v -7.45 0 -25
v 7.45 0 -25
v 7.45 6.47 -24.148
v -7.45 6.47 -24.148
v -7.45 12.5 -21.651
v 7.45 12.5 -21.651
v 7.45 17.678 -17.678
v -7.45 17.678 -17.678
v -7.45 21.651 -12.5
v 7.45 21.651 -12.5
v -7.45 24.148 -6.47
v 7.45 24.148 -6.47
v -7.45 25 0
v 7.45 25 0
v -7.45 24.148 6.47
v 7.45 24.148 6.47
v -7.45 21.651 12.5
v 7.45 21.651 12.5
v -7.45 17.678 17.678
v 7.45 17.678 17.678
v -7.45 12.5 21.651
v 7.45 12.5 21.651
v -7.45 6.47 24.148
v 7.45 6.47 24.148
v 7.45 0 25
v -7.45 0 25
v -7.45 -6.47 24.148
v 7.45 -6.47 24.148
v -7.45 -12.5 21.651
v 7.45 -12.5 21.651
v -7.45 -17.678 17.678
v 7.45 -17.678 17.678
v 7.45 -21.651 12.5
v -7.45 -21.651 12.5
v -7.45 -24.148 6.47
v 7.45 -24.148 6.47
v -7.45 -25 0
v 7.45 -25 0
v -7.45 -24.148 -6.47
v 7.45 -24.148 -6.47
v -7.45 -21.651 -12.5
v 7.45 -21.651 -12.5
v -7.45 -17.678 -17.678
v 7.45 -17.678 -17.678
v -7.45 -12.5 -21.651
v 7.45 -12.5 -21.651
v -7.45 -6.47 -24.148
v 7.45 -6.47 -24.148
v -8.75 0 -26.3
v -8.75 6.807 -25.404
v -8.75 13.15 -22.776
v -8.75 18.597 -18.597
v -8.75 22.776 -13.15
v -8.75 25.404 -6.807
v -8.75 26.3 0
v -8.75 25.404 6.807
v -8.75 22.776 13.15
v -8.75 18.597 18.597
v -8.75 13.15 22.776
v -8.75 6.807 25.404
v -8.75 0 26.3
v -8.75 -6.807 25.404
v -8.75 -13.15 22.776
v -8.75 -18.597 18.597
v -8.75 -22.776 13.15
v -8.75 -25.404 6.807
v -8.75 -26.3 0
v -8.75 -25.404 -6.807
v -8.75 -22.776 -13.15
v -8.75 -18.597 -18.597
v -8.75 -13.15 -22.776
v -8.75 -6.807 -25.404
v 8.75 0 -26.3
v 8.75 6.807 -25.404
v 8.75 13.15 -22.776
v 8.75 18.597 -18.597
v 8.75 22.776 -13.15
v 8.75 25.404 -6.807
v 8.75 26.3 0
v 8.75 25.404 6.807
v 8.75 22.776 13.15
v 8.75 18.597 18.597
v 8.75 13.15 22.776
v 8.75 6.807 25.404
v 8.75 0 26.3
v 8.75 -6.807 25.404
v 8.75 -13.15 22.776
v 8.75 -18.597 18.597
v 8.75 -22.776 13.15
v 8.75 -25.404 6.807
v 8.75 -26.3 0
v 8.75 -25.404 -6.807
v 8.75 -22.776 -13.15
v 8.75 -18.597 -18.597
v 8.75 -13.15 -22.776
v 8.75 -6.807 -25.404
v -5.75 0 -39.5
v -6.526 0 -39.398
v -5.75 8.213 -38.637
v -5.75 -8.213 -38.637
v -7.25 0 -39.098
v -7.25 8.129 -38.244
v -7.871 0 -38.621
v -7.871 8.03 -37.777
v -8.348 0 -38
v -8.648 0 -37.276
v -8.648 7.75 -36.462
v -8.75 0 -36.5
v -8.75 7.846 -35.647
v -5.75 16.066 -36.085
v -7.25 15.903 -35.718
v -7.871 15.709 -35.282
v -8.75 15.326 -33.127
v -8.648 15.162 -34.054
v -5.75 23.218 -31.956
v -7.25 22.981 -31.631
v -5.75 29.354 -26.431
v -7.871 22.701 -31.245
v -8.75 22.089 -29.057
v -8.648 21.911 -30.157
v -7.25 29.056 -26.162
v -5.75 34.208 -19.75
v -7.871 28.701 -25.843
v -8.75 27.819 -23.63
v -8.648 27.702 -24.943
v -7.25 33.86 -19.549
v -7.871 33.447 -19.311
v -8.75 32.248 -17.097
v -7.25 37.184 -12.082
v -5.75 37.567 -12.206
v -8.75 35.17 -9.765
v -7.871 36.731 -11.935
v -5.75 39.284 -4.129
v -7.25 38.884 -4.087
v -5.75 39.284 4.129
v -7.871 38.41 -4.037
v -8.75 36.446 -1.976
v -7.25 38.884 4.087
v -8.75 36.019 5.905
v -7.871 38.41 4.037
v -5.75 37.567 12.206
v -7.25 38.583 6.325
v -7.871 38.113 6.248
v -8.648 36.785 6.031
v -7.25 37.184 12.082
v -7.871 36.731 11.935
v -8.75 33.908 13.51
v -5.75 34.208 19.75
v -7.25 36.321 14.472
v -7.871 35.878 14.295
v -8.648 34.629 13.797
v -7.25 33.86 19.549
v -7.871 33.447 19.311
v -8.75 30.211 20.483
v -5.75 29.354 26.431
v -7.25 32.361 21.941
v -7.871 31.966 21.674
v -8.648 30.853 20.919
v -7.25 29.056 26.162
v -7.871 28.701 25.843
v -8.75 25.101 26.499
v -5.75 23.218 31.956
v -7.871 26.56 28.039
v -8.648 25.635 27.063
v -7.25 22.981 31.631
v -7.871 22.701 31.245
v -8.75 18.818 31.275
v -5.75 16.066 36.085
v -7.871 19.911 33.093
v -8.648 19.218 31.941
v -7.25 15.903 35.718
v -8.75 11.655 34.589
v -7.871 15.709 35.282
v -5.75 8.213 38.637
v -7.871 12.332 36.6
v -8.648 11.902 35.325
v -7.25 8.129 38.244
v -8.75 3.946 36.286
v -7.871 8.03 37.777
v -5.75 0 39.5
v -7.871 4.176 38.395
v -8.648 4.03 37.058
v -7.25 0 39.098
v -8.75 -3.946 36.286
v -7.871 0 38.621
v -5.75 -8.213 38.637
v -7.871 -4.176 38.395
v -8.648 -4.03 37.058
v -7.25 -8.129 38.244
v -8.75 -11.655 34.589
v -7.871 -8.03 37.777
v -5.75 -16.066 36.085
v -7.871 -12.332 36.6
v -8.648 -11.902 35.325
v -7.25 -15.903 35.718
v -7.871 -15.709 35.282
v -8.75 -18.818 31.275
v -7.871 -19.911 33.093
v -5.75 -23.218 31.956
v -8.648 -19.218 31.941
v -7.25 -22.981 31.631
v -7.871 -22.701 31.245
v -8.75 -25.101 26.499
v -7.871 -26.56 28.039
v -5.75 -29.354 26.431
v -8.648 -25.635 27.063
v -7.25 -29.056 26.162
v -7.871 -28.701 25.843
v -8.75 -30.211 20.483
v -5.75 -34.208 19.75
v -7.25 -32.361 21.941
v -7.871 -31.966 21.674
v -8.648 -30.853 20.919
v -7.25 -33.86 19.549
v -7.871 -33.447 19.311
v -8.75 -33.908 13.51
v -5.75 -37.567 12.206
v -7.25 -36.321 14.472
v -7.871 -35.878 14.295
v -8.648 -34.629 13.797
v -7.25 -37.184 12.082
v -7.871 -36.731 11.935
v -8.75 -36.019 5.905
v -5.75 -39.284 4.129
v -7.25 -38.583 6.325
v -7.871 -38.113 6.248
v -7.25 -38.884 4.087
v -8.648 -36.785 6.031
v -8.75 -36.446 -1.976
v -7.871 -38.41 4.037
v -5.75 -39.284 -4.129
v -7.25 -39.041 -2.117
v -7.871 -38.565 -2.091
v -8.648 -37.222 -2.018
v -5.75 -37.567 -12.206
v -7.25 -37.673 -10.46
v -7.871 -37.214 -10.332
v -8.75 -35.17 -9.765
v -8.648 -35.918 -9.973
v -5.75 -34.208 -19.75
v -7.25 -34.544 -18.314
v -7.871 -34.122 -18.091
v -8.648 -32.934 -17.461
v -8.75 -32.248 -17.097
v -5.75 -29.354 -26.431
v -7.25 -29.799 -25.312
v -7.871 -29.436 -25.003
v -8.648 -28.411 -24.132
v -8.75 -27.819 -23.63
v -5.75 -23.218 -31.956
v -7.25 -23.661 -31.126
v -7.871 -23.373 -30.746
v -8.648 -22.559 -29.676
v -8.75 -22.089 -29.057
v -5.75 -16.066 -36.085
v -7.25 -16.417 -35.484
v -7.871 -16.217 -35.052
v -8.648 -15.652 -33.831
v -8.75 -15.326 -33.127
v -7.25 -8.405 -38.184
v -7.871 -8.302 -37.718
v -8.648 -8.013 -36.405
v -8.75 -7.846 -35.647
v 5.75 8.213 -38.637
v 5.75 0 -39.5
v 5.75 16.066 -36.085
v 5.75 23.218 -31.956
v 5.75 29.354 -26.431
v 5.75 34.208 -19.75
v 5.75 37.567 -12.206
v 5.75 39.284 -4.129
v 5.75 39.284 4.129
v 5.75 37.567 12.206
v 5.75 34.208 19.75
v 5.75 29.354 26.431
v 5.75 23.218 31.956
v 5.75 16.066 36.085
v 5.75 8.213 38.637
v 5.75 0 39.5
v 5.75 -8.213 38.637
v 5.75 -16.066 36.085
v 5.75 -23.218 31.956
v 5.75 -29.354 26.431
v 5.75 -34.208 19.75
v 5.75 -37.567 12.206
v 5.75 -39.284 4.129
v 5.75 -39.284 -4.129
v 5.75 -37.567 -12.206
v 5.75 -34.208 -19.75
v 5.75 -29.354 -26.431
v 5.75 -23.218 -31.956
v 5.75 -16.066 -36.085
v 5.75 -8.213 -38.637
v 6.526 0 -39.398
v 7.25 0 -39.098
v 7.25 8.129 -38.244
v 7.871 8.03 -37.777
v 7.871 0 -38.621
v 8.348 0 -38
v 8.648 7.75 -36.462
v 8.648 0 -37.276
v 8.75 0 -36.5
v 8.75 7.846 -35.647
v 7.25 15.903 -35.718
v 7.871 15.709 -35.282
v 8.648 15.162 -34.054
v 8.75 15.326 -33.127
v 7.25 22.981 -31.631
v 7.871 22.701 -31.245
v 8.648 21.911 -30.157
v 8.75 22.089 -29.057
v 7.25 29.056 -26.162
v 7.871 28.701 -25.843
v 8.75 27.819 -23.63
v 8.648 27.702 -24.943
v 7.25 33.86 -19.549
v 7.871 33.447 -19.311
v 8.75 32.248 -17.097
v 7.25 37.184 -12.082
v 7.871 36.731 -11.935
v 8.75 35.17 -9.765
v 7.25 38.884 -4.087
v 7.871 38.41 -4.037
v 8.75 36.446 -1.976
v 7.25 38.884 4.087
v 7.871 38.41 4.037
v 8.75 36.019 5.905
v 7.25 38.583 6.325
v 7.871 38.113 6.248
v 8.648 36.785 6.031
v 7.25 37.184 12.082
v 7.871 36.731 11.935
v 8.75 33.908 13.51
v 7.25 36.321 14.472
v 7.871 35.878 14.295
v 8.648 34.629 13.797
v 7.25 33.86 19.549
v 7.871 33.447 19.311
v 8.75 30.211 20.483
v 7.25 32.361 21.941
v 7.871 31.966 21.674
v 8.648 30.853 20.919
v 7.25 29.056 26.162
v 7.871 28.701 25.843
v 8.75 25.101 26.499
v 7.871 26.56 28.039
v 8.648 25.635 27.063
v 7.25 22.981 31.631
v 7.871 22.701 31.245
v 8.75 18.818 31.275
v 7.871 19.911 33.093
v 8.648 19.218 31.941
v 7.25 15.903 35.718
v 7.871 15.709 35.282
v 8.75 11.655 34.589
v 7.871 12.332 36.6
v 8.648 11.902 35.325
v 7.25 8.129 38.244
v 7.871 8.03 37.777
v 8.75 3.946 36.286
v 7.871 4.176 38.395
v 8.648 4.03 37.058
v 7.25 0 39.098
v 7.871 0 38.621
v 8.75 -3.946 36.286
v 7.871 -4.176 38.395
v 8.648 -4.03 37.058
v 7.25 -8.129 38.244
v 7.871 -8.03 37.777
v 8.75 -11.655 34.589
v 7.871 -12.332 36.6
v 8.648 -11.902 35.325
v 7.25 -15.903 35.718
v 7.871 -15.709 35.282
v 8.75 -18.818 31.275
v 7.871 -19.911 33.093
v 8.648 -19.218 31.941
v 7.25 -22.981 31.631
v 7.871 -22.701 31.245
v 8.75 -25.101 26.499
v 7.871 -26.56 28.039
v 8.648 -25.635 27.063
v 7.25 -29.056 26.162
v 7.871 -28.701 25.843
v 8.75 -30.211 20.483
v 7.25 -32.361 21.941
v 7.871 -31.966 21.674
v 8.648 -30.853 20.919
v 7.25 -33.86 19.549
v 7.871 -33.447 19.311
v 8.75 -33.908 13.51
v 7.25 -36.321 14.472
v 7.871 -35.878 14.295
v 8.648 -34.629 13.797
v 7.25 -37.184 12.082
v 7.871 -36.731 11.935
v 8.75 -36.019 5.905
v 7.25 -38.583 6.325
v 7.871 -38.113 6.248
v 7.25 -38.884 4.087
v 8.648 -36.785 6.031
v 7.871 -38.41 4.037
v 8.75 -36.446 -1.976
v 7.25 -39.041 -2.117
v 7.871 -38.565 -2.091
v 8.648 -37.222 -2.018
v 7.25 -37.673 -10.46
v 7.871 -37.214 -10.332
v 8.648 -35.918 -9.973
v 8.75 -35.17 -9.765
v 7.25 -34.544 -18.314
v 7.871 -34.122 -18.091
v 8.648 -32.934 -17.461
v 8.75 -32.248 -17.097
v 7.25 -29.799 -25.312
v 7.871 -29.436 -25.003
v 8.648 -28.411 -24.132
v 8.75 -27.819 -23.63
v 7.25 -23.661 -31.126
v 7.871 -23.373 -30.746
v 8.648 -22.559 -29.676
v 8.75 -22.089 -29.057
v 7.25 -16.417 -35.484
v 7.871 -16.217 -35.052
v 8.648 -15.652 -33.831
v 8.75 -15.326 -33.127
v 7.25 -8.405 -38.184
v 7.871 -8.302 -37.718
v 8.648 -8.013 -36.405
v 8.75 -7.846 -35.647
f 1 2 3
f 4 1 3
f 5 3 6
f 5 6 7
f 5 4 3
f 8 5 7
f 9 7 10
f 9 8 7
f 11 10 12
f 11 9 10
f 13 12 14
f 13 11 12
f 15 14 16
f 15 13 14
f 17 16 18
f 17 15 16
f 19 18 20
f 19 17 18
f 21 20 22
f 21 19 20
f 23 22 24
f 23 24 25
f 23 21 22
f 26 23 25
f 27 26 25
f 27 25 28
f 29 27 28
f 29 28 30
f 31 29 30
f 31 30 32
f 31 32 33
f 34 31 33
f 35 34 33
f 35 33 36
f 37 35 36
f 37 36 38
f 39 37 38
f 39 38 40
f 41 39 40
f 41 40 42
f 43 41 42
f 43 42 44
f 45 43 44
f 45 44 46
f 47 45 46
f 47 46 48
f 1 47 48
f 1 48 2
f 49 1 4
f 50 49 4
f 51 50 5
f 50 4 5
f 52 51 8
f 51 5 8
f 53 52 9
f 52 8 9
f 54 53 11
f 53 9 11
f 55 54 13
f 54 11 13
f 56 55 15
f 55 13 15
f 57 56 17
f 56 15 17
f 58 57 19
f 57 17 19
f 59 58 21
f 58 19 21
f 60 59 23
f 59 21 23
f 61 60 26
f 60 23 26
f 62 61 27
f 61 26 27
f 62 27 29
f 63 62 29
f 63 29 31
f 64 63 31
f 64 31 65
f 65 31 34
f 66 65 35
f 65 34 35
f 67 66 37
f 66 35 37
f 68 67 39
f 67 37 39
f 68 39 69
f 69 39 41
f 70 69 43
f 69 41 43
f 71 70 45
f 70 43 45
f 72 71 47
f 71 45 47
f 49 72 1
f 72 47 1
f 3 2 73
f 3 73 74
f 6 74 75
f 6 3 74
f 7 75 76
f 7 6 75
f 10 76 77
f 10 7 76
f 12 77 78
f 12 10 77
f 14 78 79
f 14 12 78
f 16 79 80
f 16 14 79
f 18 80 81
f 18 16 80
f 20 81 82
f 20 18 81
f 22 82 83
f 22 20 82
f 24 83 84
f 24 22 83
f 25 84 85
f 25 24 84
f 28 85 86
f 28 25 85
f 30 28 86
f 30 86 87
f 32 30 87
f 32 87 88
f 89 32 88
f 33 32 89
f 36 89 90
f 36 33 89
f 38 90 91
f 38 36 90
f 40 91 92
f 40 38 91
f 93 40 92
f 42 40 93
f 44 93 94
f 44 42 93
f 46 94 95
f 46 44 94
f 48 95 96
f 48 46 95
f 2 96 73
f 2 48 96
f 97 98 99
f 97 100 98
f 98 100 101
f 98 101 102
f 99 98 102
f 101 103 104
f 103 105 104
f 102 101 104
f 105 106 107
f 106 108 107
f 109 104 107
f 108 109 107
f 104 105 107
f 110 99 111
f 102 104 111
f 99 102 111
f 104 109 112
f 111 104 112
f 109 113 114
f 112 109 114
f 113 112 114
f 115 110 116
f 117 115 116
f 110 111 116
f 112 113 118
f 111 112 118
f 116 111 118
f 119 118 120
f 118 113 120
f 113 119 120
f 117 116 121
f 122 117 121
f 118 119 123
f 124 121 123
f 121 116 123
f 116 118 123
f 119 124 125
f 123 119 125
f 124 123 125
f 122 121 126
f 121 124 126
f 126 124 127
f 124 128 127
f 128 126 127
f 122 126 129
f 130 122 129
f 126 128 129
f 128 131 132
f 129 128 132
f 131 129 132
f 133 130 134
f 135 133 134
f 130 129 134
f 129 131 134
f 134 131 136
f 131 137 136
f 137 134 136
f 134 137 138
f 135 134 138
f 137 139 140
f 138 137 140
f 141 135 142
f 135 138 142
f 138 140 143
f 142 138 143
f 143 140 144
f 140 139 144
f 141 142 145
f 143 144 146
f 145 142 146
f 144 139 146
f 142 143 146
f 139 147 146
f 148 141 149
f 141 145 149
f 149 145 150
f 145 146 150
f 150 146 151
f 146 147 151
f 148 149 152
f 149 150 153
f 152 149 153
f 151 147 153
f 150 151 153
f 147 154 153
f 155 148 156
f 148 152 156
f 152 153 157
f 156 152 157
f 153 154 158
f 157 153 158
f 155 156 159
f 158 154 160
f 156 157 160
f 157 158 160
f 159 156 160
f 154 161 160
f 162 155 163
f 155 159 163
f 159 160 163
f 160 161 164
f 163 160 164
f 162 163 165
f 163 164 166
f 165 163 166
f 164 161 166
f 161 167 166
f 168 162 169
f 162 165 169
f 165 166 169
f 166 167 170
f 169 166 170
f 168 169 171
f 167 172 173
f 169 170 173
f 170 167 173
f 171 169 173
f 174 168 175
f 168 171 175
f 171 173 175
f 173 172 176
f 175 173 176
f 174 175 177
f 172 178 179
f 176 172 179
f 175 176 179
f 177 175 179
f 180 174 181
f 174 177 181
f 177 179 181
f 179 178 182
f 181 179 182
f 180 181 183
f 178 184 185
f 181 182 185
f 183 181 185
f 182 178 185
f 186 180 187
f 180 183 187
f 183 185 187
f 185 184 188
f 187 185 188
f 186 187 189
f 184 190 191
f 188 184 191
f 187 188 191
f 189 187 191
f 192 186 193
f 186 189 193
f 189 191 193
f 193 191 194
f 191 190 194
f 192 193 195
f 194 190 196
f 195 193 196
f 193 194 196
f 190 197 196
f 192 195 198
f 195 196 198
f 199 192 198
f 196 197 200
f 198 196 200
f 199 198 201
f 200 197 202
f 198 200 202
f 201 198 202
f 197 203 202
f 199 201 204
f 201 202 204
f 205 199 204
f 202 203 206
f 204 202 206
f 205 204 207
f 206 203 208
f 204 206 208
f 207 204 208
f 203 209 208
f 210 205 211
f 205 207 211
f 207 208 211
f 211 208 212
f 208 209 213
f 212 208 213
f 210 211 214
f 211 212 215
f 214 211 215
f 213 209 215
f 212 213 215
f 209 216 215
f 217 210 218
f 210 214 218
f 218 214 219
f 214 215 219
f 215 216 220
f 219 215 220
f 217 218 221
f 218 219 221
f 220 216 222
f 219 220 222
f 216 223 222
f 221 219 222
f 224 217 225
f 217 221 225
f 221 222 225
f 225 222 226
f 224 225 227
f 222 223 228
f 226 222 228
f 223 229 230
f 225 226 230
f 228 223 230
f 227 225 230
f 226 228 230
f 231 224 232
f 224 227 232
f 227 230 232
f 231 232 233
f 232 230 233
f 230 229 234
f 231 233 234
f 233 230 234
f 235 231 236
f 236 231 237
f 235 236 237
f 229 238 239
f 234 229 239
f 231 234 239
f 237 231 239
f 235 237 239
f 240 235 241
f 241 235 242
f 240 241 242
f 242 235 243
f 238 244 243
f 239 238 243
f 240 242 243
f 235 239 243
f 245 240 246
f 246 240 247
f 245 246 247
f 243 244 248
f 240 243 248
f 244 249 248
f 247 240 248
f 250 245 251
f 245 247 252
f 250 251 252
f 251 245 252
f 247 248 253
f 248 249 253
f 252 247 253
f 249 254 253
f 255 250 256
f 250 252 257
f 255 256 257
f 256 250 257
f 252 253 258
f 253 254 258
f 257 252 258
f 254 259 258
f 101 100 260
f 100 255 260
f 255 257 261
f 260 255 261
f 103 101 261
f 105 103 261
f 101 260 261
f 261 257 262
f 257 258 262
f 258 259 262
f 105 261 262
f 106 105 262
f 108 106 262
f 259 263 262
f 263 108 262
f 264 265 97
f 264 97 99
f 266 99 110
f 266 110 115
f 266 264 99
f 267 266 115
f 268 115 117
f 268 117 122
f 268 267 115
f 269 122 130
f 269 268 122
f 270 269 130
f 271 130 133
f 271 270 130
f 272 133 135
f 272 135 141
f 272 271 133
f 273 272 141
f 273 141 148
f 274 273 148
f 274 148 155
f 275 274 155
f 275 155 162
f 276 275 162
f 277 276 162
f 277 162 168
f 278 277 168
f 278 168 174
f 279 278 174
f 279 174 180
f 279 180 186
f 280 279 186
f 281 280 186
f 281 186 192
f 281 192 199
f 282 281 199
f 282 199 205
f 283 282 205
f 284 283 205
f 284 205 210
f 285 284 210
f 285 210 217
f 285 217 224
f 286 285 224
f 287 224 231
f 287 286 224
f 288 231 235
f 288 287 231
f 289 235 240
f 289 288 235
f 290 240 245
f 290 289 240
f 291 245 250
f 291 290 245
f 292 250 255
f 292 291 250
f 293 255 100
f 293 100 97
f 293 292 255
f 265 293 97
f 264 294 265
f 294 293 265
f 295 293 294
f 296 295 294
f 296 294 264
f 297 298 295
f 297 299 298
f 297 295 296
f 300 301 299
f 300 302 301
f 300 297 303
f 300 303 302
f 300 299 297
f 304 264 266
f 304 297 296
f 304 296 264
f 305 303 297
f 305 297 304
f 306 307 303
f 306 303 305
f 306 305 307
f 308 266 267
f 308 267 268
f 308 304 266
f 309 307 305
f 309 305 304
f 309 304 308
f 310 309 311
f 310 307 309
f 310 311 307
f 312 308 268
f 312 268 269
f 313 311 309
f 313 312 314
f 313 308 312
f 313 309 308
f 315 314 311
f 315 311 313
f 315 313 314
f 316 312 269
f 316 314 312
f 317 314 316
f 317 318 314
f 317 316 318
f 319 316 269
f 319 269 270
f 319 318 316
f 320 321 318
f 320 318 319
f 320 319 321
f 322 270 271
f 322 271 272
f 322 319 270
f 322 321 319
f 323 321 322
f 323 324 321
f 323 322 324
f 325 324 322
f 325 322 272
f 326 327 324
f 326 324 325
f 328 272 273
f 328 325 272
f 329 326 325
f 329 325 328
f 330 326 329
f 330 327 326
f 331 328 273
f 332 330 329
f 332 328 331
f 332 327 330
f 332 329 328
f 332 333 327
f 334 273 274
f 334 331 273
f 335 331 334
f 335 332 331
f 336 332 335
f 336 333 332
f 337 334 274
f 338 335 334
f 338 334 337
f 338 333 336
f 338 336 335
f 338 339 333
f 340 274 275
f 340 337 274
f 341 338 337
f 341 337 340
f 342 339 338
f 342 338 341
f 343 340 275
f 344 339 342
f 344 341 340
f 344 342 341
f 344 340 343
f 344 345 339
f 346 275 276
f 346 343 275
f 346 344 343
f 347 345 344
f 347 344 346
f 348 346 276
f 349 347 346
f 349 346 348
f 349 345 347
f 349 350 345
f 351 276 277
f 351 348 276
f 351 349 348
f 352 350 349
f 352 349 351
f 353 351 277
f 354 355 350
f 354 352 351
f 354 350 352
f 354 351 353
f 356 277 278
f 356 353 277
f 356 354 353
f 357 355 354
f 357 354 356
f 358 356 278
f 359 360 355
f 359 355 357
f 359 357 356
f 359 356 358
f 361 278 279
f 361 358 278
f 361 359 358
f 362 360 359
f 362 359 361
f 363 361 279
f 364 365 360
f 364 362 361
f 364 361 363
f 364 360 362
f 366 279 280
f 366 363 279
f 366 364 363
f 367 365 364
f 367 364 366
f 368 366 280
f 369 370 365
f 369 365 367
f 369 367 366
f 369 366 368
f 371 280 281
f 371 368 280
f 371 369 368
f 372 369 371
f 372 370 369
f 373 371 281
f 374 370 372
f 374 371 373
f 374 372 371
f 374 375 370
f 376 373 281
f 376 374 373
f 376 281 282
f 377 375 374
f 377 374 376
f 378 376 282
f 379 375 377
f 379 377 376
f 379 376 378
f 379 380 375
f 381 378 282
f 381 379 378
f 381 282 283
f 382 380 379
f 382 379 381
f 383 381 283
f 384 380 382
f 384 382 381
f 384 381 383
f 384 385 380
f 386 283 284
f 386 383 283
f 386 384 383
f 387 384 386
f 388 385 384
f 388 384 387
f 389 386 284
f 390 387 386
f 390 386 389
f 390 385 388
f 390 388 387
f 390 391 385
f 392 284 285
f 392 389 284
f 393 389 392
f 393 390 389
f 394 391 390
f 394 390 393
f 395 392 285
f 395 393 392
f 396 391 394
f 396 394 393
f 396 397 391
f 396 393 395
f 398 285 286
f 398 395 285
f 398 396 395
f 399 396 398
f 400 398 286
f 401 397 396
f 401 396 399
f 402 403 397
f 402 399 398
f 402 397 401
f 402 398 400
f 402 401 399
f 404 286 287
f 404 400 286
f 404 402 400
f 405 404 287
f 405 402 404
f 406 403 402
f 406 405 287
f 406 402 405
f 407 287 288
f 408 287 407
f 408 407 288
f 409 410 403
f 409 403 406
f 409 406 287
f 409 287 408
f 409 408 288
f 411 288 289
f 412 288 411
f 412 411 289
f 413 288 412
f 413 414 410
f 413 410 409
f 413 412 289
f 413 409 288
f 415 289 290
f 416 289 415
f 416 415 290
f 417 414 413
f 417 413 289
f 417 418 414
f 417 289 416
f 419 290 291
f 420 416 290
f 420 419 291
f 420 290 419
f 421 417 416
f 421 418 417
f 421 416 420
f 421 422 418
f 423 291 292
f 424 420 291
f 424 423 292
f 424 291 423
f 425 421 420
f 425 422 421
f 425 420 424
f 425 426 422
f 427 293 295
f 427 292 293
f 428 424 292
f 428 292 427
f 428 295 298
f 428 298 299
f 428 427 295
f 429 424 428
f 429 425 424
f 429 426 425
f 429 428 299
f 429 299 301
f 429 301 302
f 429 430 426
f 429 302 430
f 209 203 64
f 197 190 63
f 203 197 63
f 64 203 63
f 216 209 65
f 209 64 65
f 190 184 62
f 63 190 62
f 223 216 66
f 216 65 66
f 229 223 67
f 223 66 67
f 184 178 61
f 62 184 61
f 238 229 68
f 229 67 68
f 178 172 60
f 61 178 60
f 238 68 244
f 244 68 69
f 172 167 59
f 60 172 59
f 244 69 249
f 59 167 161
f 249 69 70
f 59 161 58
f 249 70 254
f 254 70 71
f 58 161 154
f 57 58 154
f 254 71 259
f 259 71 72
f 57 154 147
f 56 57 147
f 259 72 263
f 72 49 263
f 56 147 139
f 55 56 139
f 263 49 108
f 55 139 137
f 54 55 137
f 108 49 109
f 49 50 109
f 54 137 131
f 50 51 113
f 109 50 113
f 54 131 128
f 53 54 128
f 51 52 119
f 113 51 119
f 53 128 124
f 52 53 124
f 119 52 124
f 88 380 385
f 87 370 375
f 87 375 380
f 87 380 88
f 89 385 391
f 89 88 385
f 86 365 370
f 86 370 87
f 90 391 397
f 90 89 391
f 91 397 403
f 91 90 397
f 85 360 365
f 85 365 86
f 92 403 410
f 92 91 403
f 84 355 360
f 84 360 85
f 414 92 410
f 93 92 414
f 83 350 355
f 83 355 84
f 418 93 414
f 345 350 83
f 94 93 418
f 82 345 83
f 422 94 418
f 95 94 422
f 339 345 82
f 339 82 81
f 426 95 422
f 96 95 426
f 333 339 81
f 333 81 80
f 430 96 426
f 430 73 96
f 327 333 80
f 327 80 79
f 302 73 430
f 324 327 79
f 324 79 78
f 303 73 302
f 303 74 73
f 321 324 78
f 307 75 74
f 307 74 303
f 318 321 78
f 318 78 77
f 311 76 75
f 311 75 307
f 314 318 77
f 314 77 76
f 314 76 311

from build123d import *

# Parameters (mm, degrees)
SKETCH1_R           = 39.5
SKETCH1_R_2         = 25
BOSS_EXTRUDE1_DEPTH = 8.75
FILLET1_R           = 3
CHAMFER1_SIZE       = 1.3


with BuildPart() as part:
    # Sketch1 → Boss-Extrude1 (new, symmetric)
    with BuildSketch(Plane(origin=(0, 0, 0), x_dir=(0, 0, -1), z_dir=(1, 0, 0))):
        Circle(SKETCH1_R)
        Circle(SKETCH1_R_2, mode=Mode.SUBTRACT)
    extrude(amount=BOSS_EXTRUDE1_DEPTH, both=True)

    # Fillet1
    fillet1_edges = [part.edges().sort_by_distance(p)[0] for p in [
        (-8.75, 0, 39.5),
        (8.75, 0, 39.5),
    ]]
    fillet(fillet1_edges, radius=FILLET1_R)

    # Chamfer1
    chamfer1_edges = [part.edges().sort_by_distance(p)[0] for p in [
        (-8.75, 0, 25),
        (8.75, 0, 25),
    ]]
    chamfer(chamfer1_edges, length=CHAMFER1_SIZE)


solid = part.part
